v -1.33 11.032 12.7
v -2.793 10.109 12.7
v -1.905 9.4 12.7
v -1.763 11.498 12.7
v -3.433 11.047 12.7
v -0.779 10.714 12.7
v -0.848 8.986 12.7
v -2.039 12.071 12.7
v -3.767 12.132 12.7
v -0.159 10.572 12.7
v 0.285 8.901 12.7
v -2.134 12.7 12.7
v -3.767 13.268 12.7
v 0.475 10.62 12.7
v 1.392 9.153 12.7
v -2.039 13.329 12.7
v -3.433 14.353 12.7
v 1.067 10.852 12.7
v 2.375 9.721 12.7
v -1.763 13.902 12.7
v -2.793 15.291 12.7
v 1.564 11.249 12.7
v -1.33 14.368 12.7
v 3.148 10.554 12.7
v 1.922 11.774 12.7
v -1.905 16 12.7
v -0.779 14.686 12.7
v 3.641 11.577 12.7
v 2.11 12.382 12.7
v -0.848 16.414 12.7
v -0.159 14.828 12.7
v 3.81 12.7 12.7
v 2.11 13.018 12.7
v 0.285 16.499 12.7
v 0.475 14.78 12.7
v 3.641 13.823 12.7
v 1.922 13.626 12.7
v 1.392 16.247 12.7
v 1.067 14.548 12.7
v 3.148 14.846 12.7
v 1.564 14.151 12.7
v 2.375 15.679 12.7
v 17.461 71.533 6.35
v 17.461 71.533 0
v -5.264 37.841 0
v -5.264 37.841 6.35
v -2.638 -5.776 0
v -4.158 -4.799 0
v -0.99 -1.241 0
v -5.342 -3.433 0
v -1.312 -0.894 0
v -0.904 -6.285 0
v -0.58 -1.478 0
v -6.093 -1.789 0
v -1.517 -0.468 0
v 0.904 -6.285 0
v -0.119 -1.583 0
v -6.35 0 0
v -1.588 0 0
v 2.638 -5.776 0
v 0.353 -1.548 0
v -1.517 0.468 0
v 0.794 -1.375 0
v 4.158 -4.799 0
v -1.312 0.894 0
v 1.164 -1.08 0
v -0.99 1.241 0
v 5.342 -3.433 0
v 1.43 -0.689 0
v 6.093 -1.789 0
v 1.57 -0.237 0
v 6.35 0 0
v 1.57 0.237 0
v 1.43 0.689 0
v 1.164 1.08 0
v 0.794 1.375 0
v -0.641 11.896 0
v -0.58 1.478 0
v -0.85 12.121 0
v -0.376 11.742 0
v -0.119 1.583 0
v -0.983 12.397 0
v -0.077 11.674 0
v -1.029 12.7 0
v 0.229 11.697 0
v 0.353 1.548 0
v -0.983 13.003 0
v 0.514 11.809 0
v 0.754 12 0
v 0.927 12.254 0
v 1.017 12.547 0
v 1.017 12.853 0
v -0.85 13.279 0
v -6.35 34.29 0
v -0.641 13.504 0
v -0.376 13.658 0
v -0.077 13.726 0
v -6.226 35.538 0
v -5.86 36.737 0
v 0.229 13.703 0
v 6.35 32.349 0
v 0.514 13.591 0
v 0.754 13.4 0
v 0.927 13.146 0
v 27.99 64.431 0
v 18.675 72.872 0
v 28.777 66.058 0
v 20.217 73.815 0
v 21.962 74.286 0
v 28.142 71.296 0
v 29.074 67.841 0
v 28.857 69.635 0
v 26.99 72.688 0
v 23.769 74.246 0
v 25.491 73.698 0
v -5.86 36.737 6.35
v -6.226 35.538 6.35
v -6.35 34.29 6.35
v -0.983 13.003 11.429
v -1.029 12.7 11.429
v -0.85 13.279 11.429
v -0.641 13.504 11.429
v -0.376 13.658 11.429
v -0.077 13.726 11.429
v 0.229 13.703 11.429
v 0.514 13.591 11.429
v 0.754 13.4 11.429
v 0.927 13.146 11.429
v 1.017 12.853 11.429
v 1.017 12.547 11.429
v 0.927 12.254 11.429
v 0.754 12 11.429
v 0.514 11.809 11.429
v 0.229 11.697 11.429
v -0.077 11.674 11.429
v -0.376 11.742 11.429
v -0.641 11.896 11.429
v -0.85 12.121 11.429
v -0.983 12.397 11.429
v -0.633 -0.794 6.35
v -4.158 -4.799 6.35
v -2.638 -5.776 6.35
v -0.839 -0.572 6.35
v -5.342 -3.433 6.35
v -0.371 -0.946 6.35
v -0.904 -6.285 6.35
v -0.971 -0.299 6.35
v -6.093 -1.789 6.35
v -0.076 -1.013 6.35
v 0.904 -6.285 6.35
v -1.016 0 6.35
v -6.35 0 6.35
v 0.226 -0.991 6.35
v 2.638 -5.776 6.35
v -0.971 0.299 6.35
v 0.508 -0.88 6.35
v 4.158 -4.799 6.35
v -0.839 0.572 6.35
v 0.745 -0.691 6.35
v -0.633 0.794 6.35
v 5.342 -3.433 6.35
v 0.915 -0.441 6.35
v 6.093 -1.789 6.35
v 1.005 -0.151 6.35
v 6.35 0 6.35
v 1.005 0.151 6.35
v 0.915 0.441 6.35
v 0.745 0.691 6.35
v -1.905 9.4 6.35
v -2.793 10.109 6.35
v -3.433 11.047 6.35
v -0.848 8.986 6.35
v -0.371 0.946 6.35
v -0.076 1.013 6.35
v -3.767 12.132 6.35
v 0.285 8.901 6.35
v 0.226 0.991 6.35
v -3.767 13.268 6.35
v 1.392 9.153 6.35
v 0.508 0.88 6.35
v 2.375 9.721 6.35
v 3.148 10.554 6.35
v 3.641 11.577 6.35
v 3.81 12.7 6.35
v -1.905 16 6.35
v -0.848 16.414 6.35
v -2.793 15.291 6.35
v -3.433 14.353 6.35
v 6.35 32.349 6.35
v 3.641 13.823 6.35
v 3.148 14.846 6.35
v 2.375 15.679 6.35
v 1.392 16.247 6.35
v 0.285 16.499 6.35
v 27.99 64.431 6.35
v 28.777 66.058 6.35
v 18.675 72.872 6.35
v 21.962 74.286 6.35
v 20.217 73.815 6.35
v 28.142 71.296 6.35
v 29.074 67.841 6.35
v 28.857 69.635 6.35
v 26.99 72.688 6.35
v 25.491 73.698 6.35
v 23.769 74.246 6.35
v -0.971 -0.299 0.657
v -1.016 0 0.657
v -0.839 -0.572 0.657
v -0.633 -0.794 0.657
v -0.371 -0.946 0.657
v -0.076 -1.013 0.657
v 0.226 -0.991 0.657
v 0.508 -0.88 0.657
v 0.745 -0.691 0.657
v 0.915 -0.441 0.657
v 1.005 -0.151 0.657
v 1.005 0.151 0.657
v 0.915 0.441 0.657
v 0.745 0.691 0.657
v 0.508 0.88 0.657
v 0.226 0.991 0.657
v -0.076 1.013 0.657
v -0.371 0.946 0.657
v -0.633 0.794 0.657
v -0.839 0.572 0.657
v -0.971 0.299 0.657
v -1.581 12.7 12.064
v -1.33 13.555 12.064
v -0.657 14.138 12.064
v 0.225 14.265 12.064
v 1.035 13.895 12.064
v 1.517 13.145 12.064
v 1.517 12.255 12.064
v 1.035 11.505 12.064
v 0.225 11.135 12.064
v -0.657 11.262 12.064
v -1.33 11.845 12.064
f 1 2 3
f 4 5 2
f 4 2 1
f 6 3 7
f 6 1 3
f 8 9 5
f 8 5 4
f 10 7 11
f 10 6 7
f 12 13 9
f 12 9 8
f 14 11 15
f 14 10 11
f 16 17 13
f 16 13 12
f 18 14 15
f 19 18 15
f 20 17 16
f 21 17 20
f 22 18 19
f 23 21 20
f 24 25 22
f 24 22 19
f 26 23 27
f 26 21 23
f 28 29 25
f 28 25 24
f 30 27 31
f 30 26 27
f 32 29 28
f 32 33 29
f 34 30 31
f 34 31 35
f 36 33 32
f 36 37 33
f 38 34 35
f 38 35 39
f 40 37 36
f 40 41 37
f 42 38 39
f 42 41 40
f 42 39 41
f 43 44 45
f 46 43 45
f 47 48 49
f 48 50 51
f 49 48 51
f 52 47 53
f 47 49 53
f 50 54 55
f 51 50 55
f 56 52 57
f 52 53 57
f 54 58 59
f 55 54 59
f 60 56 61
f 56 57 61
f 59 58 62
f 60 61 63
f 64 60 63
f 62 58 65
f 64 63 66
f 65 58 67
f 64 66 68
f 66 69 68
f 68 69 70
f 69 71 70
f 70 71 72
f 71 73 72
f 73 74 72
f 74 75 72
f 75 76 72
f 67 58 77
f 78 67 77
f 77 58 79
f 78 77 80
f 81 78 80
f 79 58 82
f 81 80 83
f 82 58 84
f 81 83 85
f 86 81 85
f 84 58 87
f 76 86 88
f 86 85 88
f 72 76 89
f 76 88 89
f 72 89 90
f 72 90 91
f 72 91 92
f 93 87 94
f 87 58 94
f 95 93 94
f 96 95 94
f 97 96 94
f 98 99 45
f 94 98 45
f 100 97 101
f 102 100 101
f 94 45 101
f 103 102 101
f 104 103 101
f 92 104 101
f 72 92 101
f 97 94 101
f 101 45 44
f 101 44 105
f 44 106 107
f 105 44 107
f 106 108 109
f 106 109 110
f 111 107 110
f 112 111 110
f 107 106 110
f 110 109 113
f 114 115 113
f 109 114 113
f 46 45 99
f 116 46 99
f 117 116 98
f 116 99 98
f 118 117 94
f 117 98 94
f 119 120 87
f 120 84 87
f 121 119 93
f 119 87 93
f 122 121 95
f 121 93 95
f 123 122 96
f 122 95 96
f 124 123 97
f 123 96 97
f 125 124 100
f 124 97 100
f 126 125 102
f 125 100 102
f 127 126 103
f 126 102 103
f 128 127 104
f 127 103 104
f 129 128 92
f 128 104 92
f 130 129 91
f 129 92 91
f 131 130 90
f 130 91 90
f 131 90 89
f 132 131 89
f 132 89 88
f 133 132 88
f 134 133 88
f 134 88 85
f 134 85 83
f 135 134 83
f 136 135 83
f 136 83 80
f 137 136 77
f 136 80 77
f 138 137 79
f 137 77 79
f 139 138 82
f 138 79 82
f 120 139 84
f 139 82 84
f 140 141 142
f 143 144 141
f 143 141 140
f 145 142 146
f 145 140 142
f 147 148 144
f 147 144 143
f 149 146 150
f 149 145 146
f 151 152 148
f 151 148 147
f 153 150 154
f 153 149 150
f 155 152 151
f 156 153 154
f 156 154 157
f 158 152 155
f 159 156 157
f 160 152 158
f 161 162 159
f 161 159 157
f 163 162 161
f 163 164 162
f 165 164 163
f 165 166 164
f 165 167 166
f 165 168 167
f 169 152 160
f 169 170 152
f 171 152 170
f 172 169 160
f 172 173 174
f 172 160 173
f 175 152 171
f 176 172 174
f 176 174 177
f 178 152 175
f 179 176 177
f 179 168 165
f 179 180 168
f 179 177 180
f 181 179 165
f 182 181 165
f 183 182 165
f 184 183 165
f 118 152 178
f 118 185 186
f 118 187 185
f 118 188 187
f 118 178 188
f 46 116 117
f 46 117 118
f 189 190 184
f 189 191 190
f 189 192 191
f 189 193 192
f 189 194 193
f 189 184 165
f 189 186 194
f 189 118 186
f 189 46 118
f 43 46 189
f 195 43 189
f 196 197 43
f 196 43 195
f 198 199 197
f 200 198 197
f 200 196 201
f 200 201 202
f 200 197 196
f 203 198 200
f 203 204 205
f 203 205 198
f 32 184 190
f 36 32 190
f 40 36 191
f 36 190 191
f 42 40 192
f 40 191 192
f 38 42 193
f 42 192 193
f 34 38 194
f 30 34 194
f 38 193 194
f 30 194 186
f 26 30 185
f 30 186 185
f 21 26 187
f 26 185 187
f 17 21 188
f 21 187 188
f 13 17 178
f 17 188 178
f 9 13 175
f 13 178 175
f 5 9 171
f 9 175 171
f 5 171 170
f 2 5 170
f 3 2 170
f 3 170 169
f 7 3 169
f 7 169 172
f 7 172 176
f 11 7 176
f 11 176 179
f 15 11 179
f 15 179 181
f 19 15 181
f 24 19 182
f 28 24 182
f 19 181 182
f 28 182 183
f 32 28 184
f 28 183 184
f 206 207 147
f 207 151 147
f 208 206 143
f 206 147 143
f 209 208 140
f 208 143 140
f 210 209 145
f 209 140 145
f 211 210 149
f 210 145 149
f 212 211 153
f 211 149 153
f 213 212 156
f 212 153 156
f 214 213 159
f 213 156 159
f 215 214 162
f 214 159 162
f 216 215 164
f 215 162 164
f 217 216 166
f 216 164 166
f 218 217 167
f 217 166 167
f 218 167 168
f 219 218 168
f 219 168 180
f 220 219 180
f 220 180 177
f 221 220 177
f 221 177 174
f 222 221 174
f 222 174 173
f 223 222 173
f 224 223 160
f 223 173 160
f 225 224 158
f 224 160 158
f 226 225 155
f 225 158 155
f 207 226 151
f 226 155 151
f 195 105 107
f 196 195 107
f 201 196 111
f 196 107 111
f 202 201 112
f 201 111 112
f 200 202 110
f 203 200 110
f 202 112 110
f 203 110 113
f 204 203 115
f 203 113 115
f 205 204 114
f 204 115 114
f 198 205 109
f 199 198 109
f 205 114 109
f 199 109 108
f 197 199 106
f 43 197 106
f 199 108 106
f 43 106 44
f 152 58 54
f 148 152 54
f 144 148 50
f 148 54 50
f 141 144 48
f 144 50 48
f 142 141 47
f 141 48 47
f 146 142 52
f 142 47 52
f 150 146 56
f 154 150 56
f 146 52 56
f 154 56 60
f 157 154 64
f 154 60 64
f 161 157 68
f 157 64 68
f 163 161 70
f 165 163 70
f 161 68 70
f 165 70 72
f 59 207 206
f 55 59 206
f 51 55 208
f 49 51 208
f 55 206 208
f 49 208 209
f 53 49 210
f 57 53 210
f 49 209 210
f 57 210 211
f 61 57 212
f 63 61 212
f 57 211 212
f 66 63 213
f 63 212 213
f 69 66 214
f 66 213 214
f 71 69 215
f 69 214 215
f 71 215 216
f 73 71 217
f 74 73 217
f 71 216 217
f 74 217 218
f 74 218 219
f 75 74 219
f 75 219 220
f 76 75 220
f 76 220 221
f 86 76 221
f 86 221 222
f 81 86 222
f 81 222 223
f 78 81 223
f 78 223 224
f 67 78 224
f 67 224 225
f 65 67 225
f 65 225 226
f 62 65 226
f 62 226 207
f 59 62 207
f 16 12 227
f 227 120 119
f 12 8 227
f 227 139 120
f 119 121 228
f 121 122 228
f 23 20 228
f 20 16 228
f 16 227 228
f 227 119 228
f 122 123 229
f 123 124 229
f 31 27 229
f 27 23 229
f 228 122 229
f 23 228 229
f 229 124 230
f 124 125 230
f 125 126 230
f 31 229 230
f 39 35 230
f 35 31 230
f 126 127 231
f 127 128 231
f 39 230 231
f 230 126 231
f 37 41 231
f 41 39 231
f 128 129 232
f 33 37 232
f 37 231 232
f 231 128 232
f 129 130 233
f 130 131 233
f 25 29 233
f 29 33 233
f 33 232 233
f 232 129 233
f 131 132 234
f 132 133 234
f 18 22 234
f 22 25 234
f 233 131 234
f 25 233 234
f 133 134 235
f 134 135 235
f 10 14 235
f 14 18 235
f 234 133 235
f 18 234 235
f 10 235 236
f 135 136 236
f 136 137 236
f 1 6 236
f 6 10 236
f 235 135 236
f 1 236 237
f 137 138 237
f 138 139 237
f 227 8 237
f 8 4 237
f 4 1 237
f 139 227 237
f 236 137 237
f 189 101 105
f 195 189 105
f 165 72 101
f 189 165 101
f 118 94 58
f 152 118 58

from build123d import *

# Parameters (mm, degrees)
F1_DEPTH       = 6.35
F2_R           = 3.81
F3_DEPTH       = 6.35
F5_D           = 2.0574
F5_CSINK_D     = 4.2672
F5_CSINK_ANGLE = 82
F6_D           = 2.032
F6_CSINK_D     = 3.175
F6_CSINK_ANGLE = 82


with BuildPart() as f1:
    # F0 (on Top) → F1 (new body)
    with BuildSketch(Plane.XY):
        with BuildLine():
            ThreePointArc((-6.35, 12.7), (-4.4901280605, 8.2098719395), (0, 6.35))
            Line((0, 6.35), (0, 12.7))
            Line((0, 12.7), (0, 19.05))
            ThreePointArc((0, 19.05), (-4.4901280605, 17.1901280605), (-6.35, 12.7))
        make_face()
        with BuildLine():
            Line((0, 12.7), (0, 6.35))
            ThreePointArc((0, 6.35), (4.4901280605, 8.2098719395), (6.35, 12.7))
            ThreePointArc((6.35, 12.7), (4.4901280605, 17.1901280605), (0, 19.05))
            Line((0, 19.05), (0, 12.7))
        make_face()
        with BuildLine():
            ThreePointArc((6.35, 12.7), (4.4901280605, 8.2098719395), (0, 6.35))
            ThreePointArc((0, 6.35), (-4.4901280605, 8.2098719395), (-6.35, 12.7))
            Line((-6.35, 12.7), (-6.35, 0))
            ThreePointArc((-6.35, 0), (0, -6.35), (6.35, 0))
            Line((6.35, 0), (6.35, 12.7))
        make_face()
        with BuildLine():
            ThreePointArc((0, 19.05), (4.4901280605, 17.1901280605), (6.35, 12.7))
            Line((6.35, 12.7), (6.35, 32.3486101727))
            Line((6.35, 32.3486101727), (5.2643885857, 30.739125063))
            ThreePointArc((5.2643885857, 30.739125063), (2.9811444237, 28.6832827853), (0, 27.94))
            Line((0, 27.94), (0, 19.05))
        make_face()
        with BuildLine():
            Line((-6.35, 34.29), (-6.35, 12.7))
            ThreePointArc((-6.35, 12.7), (-4.4901280605, 17.1901280605), (0, 19.05))
            Line((0, 19.05), (0, 27.94))
            ThreePointArc((0, 27.94), (-4.4901280605, 29.7998719395), (-6.35, 34.29))
        make_face()
        with BuildLine():
            Line((6.35, 34.29), (6.35, 32.3486101727))
            Line((6.35, 32.3486101727), (27.9899881828, 64.4312120116))
            ThreePointArc((27.9899881828, 64.4312120116), (26.2764745341, 73.2464755344), (17.4612110113, 71.5329618857))
            Line((17.4612110113, 71.5329618857), (-5.2643885857, 37.840874937))
            ThreePointArc((-5.2643885857, 37.840874937), (-1.2116371206, 40.5233326149), (3.550874937, 39.5543885857))
            ThreePointArc((3.550874937, 39.5543885857), (5.6067172147, 37.2711444237), (6.35, 34.29))
        make_face()
        with BuildLine():
            Line((5.2643885857, 30.739125063), (6.35, 32.3486101727))
            Line((6.35, 32.3486101727), (6.35, 34.29))
            ThreePointArc((6.35, 34.29), (5.6067172147, 37.2711444237), (3.550874937, 39.5543885857))
            Line((3.550874937, 39.5543885857), (0, 34.29))
            Line((0, 34.29), (0, 27.94))
            ThreePointArc((0, 27.94), (2.9811444237, 28.6832827853), (5.2643885857, 30.739125063))
        make_face()
        with BuildLine():
            ThreePointArc((-5.2643885857, 37.840874937), (-6.0725352004, 36.146560325), (-6.35, 34.29))
            ThreePointArc((-6.35, 34.29), (-4.4901280605, 29.7998719395), (0, 27.94))
            Line((0, 27.94), (0, 34.29))
            Line((0, 34.29), (3.550874937, 39.5543885857))
            ThreePointArc((3.550874937, 39.5543885857), (-1.2116371206, 40.5233326149), (-5.2643885857, 37.840874937))
        make_face()
    extrude(amount=F1_DEPTH)

    # F2 (on face) → F3 (join)
    with BuildSketch(Plane.XY.offset(6.35)):
        with Locations((0, 12.7)):
            Circle(F2_R)
    extrude(amount=F3_DEPTH)

    # F5 (through all)
    with Locations(Plane.XY.offset(12.7)):
        with Locations((0, 12.7)):
            CounterSinkHole(F5_D / 2, F5_CSINK_D / 2, counter_sink_angle=F5_CSINK_ANGLE)

    # F6 (through all)
    with Locations(Plane(origin=(0, 0, 0), x_dir=(1, 0, 0), z_dir=(0, 0, -1))):
        with Locations((0, 0)):
            CounterSinkHole(F6_D / 2, F6_CSINK_D / 2, counter_sink_angle=F6_CSINK_ANGLE)


solid = f1.part
